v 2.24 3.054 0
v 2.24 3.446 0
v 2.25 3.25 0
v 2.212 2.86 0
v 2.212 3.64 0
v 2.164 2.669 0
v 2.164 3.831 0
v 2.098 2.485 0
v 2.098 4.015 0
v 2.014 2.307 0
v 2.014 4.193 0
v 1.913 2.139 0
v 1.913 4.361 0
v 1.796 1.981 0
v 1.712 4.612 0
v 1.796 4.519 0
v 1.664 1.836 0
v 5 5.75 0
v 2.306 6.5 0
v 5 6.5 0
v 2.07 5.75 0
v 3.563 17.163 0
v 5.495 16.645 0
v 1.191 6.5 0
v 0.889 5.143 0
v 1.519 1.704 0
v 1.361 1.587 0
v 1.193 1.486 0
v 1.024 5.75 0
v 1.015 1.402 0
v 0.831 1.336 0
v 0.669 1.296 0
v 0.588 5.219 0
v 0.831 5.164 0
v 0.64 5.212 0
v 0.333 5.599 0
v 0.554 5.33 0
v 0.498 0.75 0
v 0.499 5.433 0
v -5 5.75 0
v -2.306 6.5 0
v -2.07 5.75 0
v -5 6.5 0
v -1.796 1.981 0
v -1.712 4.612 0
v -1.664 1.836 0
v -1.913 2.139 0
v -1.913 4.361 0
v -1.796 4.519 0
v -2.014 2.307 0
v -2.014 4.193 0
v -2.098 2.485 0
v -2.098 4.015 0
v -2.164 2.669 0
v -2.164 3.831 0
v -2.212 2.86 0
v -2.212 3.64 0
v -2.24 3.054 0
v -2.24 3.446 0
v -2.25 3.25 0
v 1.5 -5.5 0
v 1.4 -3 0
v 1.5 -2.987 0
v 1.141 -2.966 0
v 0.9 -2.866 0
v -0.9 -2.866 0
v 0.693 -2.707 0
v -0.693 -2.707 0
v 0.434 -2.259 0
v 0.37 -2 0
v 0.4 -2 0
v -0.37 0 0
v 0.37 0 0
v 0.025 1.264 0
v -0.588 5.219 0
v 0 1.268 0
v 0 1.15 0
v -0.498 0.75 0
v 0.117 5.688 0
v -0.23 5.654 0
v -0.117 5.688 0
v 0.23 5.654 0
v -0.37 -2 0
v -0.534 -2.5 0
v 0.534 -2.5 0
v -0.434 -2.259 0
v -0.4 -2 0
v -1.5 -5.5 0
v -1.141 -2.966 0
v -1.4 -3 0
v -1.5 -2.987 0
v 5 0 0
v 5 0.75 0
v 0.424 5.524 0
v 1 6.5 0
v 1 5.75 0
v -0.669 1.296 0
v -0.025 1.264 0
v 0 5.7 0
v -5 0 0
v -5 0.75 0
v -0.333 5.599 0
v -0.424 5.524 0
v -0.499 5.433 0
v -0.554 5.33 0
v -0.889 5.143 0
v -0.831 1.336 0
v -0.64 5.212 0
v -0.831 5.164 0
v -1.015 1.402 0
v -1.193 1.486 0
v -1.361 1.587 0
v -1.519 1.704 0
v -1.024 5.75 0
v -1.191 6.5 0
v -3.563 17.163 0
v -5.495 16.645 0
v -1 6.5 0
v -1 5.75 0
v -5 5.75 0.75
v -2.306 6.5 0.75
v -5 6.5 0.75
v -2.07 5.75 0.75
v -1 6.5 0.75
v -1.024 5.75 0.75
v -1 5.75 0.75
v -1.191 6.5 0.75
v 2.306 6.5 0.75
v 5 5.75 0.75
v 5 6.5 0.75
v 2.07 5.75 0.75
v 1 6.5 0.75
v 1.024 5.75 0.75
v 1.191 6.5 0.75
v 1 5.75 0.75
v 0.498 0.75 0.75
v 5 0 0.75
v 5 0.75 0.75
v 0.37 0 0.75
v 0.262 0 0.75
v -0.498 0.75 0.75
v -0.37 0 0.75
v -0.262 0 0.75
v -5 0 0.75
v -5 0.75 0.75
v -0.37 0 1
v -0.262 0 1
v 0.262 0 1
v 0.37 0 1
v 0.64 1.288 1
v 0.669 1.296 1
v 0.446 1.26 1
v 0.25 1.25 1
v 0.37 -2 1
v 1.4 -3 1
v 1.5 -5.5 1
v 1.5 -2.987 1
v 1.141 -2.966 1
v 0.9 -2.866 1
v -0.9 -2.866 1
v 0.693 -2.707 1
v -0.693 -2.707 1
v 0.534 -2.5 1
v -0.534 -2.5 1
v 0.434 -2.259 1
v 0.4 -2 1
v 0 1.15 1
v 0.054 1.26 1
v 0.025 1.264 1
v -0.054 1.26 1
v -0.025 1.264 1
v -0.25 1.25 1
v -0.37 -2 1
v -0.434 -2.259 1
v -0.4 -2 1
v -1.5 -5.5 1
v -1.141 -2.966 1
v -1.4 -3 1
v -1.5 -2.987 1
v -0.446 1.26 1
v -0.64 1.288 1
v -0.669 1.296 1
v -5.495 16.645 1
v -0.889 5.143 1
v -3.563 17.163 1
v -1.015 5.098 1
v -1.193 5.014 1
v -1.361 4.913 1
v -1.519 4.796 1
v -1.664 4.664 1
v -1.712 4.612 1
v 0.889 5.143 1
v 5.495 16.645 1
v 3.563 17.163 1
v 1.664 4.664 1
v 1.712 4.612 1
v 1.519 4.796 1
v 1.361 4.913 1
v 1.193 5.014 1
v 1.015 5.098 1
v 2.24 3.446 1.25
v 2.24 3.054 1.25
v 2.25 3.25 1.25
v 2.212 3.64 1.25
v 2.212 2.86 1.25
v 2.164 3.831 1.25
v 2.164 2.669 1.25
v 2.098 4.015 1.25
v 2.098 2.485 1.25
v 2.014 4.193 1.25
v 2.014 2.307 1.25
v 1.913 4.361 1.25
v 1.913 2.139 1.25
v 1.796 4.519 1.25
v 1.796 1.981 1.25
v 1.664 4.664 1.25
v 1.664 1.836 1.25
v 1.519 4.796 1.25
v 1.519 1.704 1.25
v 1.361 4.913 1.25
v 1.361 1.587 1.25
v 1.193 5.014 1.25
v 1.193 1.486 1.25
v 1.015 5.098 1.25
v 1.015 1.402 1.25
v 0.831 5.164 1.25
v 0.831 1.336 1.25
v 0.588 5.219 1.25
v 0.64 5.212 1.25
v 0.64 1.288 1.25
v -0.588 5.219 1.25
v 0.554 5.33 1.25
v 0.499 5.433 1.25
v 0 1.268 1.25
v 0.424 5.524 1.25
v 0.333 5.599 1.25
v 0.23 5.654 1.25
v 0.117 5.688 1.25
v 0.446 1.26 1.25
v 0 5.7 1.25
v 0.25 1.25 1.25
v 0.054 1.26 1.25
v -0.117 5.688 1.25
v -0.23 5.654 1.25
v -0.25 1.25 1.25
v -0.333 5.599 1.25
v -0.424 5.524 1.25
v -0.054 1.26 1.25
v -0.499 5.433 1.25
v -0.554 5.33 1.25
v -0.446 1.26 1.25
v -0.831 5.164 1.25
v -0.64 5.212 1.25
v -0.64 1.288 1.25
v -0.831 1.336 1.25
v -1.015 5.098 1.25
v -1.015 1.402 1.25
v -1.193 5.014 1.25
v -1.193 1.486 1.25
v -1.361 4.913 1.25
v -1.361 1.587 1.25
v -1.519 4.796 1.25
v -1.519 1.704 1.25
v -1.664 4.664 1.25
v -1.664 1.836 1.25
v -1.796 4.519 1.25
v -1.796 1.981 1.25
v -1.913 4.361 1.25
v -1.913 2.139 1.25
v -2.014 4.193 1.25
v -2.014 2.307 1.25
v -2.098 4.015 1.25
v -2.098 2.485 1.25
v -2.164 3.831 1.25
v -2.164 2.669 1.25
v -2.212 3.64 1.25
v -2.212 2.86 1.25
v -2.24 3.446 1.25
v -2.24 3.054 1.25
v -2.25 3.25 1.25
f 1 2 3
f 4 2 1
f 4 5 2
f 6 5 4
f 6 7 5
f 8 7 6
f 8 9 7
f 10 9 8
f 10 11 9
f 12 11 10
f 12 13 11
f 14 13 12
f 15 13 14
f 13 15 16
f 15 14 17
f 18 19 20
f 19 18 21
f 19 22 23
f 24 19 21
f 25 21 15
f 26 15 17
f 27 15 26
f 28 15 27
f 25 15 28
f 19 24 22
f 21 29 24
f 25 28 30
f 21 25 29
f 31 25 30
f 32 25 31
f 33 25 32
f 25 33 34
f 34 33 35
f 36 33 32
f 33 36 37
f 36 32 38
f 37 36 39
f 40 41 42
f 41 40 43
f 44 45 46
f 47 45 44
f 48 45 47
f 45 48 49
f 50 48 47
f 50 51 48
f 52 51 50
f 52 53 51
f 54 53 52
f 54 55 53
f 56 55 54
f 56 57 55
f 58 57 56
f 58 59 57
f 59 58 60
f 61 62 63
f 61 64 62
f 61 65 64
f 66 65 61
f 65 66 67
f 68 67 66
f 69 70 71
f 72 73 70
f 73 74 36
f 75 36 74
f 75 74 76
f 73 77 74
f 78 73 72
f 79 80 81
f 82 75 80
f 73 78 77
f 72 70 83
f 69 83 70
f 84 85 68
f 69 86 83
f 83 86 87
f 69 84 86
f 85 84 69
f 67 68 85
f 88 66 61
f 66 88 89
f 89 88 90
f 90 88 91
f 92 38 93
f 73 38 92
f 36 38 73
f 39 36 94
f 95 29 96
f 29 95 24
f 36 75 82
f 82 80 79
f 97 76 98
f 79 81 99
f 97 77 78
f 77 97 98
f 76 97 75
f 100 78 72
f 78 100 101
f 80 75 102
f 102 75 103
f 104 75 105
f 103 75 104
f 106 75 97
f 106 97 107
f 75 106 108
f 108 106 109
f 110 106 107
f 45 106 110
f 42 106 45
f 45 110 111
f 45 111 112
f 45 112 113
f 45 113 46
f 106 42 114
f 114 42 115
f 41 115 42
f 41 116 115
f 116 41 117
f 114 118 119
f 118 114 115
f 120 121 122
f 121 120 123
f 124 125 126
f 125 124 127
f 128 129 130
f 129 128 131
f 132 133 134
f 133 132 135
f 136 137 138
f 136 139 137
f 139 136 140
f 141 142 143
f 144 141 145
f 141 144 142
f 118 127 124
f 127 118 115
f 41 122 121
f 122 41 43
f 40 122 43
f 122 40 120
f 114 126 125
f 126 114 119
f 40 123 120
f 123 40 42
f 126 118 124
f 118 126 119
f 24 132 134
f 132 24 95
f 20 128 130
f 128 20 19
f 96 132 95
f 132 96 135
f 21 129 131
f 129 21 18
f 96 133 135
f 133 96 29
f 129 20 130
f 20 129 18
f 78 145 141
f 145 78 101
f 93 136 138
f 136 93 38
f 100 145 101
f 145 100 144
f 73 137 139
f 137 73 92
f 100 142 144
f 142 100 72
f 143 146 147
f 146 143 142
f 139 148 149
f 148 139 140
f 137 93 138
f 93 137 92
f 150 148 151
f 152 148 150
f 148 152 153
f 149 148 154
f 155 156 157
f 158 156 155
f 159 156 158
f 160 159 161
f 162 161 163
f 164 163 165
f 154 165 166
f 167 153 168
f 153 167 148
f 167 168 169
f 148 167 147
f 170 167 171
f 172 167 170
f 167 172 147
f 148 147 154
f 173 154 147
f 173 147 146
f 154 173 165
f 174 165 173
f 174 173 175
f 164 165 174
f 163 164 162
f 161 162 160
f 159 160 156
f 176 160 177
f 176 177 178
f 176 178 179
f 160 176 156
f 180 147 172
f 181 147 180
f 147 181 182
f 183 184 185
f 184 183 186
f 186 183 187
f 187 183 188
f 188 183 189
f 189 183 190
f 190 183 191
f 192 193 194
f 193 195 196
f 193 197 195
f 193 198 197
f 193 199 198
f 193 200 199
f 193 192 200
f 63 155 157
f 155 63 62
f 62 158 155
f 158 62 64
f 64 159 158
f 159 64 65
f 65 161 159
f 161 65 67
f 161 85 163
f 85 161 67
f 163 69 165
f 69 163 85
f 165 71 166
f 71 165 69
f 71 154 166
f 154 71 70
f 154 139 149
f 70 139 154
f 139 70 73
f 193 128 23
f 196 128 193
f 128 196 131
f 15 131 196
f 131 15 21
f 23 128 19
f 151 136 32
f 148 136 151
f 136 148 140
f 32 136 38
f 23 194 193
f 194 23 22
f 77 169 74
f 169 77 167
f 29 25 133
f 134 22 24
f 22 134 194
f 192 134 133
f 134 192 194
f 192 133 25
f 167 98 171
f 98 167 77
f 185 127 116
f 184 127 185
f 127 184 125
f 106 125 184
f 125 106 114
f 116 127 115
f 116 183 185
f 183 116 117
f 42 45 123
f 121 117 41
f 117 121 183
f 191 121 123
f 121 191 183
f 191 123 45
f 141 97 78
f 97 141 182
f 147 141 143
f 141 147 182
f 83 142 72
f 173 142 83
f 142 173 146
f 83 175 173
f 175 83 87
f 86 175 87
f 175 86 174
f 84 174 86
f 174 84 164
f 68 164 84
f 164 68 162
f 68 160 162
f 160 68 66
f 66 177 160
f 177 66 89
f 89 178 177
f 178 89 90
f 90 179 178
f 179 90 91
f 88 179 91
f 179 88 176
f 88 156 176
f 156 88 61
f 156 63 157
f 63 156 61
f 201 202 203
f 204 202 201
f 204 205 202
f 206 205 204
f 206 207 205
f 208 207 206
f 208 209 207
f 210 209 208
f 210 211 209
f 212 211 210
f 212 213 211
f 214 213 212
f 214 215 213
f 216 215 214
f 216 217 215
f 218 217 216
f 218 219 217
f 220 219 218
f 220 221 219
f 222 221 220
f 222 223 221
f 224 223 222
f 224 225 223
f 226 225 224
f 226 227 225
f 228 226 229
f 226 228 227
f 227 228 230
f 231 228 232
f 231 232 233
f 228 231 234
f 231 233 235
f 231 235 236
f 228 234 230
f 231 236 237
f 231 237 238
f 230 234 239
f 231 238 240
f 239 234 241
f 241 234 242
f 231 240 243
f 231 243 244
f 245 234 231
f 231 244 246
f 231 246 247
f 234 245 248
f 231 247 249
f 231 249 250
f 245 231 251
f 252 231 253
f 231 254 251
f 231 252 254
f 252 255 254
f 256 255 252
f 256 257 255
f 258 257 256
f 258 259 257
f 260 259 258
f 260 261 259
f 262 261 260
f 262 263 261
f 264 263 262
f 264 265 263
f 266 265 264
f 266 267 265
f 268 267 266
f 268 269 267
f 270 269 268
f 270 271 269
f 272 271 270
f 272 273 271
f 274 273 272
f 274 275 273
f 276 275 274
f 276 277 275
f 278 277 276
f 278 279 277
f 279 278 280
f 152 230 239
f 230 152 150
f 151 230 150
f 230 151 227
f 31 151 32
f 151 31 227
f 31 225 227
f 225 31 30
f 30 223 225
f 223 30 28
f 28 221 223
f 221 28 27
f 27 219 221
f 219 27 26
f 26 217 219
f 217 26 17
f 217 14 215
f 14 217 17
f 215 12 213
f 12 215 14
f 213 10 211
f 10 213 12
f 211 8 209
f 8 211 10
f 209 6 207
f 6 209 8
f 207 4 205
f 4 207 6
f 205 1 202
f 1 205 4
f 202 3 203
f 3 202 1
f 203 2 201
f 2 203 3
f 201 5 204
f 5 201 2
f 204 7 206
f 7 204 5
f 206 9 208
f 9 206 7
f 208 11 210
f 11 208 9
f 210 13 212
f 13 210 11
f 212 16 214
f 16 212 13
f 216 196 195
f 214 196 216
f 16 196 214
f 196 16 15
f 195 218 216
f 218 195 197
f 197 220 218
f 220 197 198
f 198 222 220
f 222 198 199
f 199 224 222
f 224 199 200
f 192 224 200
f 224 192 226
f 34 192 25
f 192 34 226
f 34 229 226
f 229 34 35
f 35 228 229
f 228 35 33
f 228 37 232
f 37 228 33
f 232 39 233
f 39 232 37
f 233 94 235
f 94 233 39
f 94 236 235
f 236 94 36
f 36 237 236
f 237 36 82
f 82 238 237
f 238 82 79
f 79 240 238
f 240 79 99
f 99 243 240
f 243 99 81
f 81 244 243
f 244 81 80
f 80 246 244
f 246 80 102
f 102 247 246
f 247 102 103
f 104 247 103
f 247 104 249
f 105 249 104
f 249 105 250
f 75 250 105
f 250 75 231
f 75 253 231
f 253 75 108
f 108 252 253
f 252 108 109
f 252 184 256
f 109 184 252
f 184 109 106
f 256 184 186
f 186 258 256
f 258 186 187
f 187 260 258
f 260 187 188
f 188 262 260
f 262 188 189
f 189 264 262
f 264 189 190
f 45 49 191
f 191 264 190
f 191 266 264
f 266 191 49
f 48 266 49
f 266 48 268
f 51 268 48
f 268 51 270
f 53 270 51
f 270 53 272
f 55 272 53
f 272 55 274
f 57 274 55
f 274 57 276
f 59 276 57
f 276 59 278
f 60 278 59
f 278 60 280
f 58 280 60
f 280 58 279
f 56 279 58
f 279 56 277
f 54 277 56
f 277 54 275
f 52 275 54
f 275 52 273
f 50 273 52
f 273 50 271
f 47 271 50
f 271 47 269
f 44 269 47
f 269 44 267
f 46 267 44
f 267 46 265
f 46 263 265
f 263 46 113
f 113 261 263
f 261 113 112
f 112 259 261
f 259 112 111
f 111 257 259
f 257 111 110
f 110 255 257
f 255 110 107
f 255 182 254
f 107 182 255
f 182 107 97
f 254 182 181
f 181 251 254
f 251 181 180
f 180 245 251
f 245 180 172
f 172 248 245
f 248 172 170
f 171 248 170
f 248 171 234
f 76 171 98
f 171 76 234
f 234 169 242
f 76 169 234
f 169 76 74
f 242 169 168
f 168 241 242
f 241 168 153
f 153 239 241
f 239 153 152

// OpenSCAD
// fluidic logic element
// units are in mm
//
// design based off of US Patent 3,825,739
// http://www.google.com/patents?id=tZAzAAAAEBAJ&zoom=4&pg=PA1#v=onepage&q&f=false


// scale of fluidic device
d = .5;

// height of fluidic device
h = 2;

// 80
powerNozzleLength = 6;

// 92 & 93
controlNozzleLength = 10;
controlNozzleWidth = 1.5;

// 98 & 99
bleedChannelLength = 10;
bleedChannelWidth = 1.5;
bleedChannelDistance = 10;


// 86 & 87
outputChannelLength = 35;
outputChannelEndWidth = 4;
outputChannelAngle = 15;


// 84 & 85
chamberDistance = 6.5;
chamberOffset = .5;
chamberRadius = 4;

// 96
feedbackDistance = 10.2;
feedbackRadius = 1.2;

difference() {
%
	union() {
		translate([-10 * d, -11 * d, -1])
		cube([20 * d, 43 * d, 3 * d * h]);	

		// power source
		translate([0 * d, -11 * d, -1])
		inputTube();

		// control
		translate([-10 * d, 1 * d, -1])
		inputTube();

		translate([10 * d, 1 * d, -1])
		inputTube();

		// output
		translate([-9 * d, 33 * d, -1])
		inputTube();

		translate([9 * d, 33 * d, -1])
		inputTube();
	}

	#
	fluidicFlipFlop();
}

module inputTube() {
	difference() {
		cylinder(r=2.5, h=10, $fn=24);

		translate([0, 0, 1])
		cylinder(r=1.5, h=10, $fn=24);
	}
}

module fluidicFlipFlop() {
	difference() {
		union() {
			linear_extrude(height = h * d - 0.25, convexity = 10) {
				// control nozzles (92 & 93)
				rectangle(-controlNozzleLength * d, 0, controlNozzleLength * d, controlNozzleWidth * d);


				// bleed channel (98)
				rectangle(
					-bleedChannelLength * d,  
					(bleedChannelDistance + controlNozzleWidth) * d, 
					-2 * d,	 
					(bleedChannelDistance + bleedChannelWidth + controlNozzleWidth) * d);	

				// bleed channel (99)
				rectangle(
					bleedChannelLength * d,  
					(bleedChannelDistance + controlNozzleWidth) * d, 
					2 * d, 
					(bleedChannelDistance + bleedChannelWidth + controlNozzleWidth) * d);
			}
			
			linear_extrude(height = h * d, convexity = 10) {
				// power nozzle (80)
				difference() {
					rectangle(-1.5, -4 * d, 1.5, -11*d);

					translate([-1.4, -2])
					circle(2 * d, $fn=24);

					translate([1.4, -2])
					circle(2* d, $fn=24);
				}

				rectangle(-d/2 - 0.12, 0, d/2 + 0.12, -powerNozzleLength * d);

				// output channel (86)
				rotate([0, 0, outputChannelAngle])
				trapezoid(outputChannelLength * d, d, outputChannelEndWidth * d);

				// output channel (87)
				rotate([0, 0, -outputChannelAngle])
				trapezoid(outputChannelLength * d, d, outputChannelEndWidth * d);
			}
			

			linear_extrude(height = h * d + 0.25, convexity = 10) {
				// chamber (84)
				translate([-chamberOffset * d, chamberDistance * d, 0])
				circle(chamberRadius * d, $fn = 64);

				// chamber (85)
				translate([chamberOffset * d, chamberDistance * d, 0])
				circle(chamberRadius * d, $fn =64);

				// chamber feedback (96)
				translate([0, feedbackDistance * d, 0])
				circle(feedbackRadius * d, $fn=32);	
			}

		}

		
		/*
		linear_extrude(height = h * d + 0.25, convexity = 10) 
		union() {

			// chamber support
			translate([0, 8, 0])
			circle(radius = .5, $fn=30);

		}*/
	}
}

module rectangle(x1, y1, x2, y2) {
	polygon(points=[[x1, y1], [x1, y2],[x2, y2], [x2, y1]], paths=[[0, 1, 2, 3]]);
}

module trapezoid(length, w1, w2) {
	polygon(points=[[-w1/2, 0], [-w2/2, length],[w2/2, length], [w1/2, 0]], paths=[[0, 1, 2, 3]]);
}
